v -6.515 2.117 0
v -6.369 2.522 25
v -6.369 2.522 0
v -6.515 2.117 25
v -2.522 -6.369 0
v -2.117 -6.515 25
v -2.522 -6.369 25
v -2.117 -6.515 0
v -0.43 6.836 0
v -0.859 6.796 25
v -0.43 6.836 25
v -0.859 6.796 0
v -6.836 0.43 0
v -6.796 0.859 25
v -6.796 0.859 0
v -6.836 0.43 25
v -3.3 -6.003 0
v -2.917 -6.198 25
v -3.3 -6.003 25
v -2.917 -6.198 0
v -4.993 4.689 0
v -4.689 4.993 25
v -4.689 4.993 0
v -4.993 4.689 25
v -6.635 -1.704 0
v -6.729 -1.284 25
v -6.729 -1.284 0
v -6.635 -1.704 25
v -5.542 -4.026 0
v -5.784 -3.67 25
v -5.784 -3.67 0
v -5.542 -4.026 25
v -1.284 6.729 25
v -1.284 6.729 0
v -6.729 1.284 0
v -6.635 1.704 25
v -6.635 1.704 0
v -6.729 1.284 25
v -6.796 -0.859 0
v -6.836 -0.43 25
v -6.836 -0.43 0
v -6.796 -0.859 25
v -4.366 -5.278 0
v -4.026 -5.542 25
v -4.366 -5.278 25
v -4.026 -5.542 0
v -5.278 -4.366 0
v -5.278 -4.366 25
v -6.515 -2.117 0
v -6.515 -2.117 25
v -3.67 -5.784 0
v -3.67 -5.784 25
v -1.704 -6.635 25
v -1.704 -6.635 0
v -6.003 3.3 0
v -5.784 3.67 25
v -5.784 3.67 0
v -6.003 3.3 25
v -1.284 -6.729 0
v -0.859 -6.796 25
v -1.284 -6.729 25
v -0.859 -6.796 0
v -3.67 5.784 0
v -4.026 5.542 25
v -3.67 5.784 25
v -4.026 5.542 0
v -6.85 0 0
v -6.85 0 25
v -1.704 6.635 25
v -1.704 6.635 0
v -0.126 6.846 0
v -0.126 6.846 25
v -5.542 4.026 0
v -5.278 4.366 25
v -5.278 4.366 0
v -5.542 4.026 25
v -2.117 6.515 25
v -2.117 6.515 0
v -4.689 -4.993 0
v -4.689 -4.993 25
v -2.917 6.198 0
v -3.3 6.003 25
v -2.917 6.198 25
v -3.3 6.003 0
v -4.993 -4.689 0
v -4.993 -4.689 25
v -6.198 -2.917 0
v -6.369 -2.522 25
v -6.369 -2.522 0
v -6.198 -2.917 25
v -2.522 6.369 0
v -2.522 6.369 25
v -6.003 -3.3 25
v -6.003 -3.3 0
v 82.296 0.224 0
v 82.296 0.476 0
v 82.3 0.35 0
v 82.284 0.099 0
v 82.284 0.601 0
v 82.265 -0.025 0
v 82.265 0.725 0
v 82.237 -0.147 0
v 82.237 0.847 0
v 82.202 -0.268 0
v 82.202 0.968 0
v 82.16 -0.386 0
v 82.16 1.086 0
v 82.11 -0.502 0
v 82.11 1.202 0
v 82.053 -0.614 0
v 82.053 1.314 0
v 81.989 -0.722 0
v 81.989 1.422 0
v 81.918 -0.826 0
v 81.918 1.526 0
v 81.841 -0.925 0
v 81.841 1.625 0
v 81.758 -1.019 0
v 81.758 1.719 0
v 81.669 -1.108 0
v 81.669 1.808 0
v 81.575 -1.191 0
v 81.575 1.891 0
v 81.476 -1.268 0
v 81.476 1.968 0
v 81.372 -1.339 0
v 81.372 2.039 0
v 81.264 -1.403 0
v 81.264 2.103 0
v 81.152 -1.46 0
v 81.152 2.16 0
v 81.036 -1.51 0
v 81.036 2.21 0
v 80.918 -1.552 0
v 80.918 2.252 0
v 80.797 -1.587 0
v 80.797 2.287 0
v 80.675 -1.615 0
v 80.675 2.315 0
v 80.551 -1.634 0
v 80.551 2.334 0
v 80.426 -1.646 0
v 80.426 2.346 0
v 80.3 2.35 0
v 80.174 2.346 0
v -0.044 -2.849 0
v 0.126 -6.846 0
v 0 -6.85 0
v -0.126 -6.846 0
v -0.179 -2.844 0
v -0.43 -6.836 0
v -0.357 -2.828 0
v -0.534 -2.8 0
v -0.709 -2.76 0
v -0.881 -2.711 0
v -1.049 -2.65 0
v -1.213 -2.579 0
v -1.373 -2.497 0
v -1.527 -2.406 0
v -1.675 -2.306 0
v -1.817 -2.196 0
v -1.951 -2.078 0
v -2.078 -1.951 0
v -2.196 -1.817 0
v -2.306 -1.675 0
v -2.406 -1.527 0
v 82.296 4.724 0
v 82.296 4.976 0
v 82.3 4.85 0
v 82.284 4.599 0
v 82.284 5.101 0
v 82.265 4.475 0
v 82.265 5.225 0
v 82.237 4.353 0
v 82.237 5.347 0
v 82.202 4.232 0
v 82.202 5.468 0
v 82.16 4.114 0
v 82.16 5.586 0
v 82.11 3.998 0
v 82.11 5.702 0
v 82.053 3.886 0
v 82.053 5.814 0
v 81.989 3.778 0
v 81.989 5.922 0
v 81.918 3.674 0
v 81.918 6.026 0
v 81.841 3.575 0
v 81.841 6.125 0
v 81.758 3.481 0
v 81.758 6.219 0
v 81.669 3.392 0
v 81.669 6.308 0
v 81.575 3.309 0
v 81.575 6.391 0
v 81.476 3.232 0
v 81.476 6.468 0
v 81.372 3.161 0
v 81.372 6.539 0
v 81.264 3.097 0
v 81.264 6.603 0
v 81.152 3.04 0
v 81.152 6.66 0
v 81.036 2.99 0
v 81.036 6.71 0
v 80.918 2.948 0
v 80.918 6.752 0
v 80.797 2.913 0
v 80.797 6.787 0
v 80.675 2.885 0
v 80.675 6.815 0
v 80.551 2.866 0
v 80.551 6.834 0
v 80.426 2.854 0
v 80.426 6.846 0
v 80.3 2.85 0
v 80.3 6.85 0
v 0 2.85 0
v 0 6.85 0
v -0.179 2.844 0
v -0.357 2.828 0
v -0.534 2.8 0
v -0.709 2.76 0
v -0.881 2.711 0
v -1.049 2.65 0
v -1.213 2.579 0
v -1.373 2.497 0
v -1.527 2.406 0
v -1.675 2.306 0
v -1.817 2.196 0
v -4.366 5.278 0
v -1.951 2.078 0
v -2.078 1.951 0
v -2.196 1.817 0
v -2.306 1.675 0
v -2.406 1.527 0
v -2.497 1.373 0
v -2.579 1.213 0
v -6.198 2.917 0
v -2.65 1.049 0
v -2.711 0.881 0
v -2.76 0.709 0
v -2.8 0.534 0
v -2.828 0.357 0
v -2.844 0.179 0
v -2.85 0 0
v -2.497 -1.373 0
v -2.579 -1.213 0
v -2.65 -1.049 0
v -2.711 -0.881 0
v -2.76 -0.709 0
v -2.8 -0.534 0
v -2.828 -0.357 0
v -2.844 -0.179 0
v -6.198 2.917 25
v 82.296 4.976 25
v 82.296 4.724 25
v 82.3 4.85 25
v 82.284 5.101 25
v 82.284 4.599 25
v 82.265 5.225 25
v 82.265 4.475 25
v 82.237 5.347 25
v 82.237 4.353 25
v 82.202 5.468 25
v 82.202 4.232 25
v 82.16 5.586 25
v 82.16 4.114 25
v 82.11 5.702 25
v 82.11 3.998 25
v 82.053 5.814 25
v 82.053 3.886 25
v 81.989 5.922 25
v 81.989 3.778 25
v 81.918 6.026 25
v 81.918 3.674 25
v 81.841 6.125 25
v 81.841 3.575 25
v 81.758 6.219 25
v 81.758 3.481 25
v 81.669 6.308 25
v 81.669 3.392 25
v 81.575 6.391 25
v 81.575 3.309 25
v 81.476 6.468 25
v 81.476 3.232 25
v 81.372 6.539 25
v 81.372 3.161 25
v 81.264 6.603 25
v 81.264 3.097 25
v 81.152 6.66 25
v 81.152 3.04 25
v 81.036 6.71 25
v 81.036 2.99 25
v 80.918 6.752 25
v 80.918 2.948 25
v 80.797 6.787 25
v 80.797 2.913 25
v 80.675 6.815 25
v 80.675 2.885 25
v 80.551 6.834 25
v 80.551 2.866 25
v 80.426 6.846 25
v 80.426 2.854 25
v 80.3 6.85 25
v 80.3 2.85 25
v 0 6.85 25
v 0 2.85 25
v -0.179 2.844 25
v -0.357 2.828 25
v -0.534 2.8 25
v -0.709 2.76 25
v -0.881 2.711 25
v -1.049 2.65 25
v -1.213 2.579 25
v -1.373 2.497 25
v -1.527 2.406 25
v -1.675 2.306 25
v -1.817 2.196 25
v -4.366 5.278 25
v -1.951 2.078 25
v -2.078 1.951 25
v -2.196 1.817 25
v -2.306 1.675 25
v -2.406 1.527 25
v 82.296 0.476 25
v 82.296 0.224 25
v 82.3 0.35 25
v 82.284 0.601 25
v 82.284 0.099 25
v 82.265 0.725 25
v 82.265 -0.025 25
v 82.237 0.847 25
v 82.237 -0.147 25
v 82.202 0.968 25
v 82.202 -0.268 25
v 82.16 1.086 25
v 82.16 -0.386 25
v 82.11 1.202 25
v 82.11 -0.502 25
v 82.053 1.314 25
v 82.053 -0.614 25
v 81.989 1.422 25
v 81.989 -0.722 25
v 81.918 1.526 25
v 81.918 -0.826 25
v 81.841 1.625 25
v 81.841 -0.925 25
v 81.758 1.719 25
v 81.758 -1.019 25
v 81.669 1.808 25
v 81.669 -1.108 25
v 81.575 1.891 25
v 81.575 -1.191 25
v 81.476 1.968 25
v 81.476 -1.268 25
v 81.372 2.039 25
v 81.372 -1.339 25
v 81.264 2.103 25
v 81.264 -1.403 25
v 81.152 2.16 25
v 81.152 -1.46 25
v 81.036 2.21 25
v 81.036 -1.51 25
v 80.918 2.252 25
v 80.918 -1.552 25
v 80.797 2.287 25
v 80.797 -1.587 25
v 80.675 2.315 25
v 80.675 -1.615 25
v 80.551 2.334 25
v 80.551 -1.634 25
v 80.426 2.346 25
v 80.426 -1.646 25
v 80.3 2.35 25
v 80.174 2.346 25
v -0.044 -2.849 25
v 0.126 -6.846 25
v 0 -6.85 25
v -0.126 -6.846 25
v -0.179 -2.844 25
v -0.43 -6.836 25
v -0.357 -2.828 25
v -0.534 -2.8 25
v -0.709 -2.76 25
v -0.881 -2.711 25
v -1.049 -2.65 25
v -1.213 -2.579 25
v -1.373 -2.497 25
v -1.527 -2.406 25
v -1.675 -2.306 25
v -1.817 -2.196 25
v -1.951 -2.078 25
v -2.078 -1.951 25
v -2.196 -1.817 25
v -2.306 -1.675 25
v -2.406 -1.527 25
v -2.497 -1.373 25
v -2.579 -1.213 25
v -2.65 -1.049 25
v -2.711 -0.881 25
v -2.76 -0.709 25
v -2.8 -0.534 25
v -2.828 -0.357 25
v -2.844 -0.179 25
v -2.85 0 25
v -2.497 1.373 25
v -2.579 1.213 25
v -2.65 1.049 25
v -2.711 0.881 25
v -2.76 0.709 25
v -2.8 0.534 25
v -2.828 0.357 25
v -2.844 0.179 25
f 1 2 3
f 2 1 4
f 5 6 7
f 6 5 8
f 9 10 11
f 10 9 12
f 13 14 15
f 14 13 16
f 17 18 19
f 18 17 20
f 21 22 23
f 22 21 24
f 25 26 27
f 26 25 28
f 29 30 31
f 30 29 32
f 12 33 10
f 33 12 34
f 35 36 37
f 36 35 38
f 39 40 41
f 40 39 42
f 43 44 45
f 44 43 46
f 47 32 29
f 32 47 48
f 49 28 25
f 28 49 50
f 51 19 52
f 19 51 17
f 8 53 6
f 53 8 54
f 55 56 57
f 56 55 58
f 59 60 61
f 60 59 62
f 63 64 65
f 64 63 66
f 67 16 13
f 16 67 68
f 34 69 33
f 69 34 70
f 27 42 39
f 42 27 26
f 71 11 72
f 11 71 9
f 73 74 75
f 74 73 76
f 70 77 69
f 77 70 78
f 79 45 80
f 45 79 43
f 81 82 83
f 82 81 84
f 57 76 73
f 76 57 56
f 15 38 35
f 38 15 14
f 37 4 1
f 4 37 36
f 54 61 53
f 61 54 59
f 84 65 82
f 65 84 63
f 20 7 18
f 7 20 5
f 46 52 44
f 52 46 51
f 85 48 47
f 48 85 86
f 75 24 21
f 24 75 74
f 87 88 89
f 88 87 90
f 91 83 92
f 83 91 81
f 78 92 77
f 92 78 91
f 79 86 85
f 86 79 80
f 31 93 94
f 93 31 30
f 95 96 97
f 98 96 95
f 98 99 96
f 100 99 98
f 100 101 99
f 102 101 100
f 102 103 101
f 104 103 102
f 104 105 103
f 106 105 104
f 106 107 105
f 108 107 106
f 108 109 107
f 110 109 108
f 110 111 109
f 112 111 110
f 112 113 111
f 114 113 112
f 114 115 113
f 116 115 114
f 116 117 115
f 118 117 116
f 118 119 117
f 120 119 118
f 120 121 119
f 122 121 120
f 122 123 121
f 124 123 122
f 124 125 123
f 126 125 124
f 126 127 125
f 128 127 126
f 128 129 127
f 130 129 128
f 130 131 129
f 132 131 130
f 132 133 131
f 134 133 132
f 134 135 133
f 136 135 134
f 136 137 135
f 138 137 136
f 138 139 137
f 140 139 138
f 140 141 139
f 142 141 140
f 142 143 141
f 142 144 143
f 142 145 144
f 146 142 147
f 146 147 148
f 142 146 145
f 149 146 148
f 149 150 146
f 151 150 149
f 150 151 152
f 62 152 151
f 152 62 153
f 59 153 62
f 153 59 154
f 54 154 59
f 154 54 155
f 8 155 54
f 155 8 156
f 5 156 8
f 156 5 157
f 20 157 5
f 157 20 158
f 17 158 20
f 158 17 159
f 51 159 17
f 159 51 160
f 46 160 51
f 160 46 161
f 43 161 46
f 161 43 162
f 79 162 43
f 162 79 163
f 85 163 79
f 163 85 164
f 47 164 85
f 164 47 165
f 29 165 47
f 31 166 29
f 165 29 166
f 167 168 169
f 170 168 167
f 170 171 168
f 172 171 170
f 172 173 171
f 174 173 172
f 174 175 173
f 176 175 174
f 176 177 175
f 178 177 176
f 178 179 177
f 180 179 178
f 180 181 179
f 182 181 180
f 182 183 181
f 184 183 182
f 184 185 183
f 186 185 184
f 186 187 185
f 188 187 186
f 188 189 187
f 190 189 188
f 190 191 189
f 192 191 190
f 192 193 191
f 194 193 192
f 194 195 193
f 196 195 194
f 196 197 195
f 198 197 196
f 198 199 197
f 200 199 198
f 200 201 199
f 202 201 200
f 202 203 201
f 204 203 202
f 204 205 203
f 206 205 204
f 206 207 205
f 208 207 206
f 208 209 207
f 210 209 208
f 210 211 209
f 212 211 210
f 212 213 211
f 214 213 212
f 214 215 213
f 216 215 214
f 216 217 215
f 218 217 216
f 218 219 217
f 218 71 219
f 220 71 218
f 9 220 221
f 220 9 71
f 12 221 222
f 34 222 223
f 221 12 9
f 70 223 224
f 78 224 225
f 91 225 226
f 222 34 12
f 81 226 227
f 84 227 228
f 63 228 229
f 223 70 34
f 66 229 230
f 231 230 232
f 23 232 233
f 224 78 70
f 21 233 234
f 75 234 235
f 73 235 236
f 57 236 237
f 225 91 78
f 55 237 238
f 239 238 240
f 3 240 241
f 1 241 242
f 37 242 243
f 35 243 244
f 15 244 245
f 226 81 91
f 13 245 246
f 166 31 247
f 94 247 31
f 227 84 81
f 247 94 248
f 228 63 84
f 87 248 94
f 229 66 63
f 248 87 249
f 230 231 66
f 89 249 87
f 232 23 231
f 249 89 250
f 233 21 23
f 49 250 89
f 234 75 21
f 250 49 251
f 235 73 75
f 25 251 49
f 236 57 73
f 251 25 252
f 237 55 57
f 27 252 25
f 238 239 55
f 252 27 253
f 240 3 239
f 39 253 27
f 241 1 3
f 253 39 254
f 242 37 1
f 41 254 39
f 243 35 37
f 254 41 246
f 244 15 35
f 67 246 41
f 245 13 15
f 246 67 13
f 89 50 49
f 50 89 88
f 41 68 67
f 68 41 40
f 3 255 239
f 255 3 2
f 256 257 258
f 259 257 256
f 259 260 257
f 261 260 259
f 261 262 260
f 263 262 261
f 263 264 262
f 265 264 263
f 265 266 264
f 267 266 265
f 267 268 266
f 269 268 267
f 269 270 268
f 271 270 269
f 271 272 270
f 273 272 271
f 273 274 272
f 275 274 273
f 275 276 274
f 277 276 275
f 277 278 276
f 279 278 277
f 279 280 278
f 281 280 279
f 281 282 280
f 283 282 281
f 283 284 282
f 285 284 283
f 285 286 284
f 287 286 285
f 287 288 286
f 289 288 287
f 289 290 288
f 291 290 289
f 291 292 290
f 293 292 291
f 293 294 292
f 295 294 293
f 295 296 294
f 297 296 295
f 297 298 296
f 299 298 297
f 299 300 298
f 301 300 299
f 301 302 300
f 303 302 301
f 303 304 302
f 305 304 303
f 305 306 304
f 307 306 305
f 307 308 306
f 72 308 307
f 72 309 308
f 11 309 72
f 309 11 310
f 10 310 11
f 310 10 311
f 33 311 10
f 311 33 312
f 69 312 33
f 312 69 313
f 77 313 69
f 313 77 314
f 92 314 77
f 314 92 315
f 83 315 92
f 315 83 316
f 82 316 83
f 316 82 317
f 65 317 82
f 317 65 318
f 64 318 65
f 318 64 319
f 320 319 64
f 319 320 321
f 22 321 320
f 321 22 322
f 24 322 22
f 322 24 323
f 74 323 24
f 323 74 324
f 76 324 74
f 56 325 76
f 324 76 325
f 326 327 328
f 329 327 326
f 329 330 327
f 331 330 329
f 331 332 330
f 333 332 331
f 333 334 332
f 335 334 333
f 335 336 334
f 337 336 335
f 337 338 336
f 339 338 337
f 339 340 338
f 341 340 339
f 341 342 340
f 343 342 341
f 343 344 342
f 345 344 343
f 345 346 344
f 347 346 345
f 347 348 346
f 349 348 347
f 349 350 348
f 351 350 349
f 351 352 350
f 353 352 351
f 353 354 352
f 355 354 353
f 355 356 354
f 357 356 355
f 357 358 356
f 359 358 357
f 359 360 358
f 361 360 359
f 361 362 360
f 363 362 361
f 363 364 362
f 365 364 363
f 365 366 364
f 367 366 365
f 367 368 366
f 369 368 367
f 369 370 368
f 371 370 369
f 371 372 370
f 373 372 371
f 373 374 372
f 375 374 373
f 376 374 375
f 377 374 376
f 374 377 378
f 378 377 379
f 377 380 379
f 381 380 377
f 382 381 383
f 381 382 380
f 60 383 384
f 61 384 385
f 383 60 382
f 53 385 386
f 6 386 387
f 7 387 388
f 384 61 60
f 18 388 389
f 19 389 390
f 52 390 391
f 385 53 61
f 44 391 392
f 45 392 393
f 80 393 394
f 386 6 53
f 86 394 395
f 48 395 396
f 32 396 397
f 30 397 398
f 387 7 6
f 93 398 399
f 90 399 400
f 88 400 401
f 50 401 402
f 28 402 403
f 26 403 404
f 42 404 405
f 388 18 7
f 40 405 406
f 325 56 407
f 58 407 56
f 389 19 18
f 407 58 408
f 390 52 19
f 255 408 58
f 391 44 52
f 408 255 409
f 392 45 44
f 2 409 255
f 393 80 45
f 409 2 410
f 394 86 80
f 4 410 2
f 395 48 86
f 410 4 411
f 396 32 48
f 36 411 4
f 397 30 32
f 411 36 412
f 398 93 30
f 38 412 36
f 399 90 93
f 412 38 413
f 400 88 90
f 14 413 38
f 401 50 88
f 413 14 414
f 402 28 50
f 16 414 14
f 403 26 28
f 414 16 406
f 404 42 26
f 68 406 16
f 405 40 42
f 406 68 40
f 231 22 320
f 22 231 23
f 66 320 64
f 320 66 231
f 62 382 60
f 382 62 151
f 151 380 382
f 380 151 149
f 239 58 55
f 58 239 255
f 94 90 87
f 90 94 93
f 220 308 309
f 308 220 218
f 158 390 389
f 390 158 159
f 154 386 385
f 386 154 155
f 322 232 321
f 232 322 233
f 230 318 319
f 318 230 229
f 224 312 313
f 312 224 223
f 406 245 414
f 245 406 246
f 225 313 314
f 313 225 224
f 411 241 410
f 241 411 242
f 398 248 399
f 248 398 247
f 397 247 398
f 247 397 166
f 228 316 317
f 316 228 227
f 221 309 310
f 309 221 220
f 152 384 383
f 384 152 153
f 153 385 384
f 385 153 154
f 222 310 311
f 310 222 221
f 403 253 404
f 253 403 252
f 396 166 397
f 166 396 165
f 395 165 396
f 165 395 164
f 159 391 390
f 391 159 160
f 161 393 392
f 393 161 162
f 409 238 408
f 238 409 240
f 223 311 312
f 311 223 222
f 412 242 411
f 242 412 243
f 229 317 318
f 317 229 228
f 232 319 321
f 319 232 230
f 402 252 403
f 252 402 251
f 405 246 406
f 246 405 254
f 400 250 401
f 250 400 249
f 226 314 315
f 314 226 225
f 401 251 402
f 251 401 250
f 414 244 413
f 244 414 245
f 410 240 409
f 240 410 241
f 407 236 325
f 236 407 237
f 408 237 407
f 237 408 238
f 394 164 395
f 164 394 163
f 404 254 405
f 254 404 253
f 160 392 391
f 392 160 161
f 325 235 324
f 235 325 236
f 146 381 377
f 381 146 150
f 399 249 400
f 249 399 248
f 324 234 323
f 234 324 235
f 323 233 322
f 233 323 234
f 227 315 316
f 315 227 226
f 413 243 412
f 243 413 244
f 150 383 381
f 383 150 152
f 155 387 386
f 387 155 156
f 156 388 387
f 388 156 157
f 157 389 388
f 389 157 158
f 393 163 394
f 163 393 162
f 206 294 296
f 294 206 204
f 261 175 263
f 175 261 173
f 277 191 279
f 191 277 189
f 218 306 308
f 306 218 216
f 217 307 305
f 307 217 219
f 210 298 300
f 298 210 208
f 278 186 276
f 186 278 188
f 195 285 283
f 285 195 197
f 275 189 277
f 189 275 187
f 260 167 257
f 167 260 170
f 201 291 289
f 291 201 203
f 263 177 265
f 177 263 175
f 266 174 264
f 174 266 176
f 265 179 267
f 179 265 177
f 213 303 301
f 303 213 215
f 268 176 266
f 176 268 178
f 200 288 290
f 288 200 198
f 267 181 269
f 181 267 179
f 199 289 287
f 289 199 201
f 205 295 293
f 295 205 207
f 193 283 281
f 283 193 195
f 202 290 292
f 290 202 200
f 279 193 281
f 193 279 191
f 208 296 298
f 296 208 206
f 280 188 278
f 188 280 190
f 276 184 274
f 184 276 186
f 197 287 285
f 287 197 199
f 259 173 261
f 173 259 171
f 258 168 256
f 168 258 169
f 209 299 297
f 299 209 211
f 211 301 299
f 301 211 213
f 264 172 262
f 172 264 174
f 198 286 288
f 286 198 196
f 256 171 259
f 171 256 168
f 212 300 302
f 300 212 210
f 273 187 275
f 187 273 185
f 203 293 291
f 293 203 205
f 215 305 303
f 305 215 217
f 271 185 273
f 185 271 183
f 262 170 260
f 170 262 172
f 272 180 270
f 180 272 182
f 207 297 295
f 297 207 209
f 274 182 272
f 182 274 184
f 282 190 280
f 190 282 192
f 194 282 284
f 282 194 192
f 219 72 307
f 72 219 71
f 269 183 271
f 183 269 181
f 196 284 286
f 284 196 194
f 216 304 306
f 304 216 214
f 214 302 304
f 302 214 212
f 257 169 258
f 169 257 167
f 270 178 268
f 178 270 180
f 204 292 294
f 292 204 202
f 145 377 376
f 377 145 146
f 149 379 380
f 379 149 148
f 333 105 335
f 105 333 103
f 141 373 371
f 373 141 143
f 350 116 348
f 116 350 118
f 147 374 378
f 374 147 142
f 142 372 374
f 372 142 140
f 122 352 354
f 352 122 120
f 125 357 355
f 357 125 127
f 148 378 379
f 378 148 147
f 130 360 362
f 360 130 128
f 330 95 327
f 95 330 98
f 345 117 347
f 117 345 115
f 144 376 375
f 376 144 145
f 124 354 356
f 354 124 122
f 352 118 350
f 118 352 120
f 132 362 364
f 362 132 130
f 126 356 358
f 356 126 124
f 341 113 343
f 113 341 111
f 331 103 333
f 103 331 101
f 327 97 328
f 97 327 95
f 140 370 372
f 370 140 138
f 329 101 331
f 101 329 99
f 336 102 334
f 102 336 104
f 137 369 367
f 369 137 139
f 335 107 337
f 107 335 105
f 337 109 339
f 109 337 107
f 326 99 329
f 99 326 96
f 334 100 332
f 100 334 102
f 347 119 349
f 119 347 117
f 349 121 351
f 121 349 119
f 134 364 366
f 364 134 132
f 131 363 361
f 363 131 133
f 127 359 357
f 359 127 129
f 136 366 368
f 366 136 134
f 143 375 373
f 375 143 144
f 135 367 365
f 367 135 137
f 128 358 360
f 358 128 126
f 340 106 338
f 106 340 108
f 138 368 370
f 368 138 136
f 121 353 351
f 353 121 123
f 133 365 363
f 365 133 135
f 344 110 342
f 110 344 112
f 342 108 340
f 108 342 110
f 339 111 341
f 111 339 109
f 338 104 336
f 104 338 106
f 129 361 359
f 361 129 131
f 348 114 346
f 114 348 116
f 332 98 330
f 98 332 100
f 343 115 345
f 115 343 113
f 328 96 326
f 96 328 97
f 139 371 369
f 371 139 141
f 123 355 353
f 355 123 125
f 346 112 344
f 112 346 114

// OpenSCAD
WIDTH = 25;
LENGTH = 90;
THICKNESS = 4;
THICKNESS_END = 4;
GAP = 5.7;

$fn = 100;


module leg(off = 0) {
  hull() {
    cylinder(d = THICKNESS, h = WIDTH);
    translate([LENGTH - THICKNESS - GAP, off, 0])
    cylinder(d = THICKNESS_END, h = WIDTH);
  }
}

difference() {
  cylinder(d = THICKNESS * 2 + GAP, h = WIDTH);
  #cylinder(d = GAP, h = WIDTH);
  #translate([0, -WIDTH/2, 0])
  cube(WIDTH);
}

translate([0, (GAP+THICKNESS)/2])
leg();

translate([0, -(GAP+THICKNESS)/2])
  leg(GAP - 0.5);
